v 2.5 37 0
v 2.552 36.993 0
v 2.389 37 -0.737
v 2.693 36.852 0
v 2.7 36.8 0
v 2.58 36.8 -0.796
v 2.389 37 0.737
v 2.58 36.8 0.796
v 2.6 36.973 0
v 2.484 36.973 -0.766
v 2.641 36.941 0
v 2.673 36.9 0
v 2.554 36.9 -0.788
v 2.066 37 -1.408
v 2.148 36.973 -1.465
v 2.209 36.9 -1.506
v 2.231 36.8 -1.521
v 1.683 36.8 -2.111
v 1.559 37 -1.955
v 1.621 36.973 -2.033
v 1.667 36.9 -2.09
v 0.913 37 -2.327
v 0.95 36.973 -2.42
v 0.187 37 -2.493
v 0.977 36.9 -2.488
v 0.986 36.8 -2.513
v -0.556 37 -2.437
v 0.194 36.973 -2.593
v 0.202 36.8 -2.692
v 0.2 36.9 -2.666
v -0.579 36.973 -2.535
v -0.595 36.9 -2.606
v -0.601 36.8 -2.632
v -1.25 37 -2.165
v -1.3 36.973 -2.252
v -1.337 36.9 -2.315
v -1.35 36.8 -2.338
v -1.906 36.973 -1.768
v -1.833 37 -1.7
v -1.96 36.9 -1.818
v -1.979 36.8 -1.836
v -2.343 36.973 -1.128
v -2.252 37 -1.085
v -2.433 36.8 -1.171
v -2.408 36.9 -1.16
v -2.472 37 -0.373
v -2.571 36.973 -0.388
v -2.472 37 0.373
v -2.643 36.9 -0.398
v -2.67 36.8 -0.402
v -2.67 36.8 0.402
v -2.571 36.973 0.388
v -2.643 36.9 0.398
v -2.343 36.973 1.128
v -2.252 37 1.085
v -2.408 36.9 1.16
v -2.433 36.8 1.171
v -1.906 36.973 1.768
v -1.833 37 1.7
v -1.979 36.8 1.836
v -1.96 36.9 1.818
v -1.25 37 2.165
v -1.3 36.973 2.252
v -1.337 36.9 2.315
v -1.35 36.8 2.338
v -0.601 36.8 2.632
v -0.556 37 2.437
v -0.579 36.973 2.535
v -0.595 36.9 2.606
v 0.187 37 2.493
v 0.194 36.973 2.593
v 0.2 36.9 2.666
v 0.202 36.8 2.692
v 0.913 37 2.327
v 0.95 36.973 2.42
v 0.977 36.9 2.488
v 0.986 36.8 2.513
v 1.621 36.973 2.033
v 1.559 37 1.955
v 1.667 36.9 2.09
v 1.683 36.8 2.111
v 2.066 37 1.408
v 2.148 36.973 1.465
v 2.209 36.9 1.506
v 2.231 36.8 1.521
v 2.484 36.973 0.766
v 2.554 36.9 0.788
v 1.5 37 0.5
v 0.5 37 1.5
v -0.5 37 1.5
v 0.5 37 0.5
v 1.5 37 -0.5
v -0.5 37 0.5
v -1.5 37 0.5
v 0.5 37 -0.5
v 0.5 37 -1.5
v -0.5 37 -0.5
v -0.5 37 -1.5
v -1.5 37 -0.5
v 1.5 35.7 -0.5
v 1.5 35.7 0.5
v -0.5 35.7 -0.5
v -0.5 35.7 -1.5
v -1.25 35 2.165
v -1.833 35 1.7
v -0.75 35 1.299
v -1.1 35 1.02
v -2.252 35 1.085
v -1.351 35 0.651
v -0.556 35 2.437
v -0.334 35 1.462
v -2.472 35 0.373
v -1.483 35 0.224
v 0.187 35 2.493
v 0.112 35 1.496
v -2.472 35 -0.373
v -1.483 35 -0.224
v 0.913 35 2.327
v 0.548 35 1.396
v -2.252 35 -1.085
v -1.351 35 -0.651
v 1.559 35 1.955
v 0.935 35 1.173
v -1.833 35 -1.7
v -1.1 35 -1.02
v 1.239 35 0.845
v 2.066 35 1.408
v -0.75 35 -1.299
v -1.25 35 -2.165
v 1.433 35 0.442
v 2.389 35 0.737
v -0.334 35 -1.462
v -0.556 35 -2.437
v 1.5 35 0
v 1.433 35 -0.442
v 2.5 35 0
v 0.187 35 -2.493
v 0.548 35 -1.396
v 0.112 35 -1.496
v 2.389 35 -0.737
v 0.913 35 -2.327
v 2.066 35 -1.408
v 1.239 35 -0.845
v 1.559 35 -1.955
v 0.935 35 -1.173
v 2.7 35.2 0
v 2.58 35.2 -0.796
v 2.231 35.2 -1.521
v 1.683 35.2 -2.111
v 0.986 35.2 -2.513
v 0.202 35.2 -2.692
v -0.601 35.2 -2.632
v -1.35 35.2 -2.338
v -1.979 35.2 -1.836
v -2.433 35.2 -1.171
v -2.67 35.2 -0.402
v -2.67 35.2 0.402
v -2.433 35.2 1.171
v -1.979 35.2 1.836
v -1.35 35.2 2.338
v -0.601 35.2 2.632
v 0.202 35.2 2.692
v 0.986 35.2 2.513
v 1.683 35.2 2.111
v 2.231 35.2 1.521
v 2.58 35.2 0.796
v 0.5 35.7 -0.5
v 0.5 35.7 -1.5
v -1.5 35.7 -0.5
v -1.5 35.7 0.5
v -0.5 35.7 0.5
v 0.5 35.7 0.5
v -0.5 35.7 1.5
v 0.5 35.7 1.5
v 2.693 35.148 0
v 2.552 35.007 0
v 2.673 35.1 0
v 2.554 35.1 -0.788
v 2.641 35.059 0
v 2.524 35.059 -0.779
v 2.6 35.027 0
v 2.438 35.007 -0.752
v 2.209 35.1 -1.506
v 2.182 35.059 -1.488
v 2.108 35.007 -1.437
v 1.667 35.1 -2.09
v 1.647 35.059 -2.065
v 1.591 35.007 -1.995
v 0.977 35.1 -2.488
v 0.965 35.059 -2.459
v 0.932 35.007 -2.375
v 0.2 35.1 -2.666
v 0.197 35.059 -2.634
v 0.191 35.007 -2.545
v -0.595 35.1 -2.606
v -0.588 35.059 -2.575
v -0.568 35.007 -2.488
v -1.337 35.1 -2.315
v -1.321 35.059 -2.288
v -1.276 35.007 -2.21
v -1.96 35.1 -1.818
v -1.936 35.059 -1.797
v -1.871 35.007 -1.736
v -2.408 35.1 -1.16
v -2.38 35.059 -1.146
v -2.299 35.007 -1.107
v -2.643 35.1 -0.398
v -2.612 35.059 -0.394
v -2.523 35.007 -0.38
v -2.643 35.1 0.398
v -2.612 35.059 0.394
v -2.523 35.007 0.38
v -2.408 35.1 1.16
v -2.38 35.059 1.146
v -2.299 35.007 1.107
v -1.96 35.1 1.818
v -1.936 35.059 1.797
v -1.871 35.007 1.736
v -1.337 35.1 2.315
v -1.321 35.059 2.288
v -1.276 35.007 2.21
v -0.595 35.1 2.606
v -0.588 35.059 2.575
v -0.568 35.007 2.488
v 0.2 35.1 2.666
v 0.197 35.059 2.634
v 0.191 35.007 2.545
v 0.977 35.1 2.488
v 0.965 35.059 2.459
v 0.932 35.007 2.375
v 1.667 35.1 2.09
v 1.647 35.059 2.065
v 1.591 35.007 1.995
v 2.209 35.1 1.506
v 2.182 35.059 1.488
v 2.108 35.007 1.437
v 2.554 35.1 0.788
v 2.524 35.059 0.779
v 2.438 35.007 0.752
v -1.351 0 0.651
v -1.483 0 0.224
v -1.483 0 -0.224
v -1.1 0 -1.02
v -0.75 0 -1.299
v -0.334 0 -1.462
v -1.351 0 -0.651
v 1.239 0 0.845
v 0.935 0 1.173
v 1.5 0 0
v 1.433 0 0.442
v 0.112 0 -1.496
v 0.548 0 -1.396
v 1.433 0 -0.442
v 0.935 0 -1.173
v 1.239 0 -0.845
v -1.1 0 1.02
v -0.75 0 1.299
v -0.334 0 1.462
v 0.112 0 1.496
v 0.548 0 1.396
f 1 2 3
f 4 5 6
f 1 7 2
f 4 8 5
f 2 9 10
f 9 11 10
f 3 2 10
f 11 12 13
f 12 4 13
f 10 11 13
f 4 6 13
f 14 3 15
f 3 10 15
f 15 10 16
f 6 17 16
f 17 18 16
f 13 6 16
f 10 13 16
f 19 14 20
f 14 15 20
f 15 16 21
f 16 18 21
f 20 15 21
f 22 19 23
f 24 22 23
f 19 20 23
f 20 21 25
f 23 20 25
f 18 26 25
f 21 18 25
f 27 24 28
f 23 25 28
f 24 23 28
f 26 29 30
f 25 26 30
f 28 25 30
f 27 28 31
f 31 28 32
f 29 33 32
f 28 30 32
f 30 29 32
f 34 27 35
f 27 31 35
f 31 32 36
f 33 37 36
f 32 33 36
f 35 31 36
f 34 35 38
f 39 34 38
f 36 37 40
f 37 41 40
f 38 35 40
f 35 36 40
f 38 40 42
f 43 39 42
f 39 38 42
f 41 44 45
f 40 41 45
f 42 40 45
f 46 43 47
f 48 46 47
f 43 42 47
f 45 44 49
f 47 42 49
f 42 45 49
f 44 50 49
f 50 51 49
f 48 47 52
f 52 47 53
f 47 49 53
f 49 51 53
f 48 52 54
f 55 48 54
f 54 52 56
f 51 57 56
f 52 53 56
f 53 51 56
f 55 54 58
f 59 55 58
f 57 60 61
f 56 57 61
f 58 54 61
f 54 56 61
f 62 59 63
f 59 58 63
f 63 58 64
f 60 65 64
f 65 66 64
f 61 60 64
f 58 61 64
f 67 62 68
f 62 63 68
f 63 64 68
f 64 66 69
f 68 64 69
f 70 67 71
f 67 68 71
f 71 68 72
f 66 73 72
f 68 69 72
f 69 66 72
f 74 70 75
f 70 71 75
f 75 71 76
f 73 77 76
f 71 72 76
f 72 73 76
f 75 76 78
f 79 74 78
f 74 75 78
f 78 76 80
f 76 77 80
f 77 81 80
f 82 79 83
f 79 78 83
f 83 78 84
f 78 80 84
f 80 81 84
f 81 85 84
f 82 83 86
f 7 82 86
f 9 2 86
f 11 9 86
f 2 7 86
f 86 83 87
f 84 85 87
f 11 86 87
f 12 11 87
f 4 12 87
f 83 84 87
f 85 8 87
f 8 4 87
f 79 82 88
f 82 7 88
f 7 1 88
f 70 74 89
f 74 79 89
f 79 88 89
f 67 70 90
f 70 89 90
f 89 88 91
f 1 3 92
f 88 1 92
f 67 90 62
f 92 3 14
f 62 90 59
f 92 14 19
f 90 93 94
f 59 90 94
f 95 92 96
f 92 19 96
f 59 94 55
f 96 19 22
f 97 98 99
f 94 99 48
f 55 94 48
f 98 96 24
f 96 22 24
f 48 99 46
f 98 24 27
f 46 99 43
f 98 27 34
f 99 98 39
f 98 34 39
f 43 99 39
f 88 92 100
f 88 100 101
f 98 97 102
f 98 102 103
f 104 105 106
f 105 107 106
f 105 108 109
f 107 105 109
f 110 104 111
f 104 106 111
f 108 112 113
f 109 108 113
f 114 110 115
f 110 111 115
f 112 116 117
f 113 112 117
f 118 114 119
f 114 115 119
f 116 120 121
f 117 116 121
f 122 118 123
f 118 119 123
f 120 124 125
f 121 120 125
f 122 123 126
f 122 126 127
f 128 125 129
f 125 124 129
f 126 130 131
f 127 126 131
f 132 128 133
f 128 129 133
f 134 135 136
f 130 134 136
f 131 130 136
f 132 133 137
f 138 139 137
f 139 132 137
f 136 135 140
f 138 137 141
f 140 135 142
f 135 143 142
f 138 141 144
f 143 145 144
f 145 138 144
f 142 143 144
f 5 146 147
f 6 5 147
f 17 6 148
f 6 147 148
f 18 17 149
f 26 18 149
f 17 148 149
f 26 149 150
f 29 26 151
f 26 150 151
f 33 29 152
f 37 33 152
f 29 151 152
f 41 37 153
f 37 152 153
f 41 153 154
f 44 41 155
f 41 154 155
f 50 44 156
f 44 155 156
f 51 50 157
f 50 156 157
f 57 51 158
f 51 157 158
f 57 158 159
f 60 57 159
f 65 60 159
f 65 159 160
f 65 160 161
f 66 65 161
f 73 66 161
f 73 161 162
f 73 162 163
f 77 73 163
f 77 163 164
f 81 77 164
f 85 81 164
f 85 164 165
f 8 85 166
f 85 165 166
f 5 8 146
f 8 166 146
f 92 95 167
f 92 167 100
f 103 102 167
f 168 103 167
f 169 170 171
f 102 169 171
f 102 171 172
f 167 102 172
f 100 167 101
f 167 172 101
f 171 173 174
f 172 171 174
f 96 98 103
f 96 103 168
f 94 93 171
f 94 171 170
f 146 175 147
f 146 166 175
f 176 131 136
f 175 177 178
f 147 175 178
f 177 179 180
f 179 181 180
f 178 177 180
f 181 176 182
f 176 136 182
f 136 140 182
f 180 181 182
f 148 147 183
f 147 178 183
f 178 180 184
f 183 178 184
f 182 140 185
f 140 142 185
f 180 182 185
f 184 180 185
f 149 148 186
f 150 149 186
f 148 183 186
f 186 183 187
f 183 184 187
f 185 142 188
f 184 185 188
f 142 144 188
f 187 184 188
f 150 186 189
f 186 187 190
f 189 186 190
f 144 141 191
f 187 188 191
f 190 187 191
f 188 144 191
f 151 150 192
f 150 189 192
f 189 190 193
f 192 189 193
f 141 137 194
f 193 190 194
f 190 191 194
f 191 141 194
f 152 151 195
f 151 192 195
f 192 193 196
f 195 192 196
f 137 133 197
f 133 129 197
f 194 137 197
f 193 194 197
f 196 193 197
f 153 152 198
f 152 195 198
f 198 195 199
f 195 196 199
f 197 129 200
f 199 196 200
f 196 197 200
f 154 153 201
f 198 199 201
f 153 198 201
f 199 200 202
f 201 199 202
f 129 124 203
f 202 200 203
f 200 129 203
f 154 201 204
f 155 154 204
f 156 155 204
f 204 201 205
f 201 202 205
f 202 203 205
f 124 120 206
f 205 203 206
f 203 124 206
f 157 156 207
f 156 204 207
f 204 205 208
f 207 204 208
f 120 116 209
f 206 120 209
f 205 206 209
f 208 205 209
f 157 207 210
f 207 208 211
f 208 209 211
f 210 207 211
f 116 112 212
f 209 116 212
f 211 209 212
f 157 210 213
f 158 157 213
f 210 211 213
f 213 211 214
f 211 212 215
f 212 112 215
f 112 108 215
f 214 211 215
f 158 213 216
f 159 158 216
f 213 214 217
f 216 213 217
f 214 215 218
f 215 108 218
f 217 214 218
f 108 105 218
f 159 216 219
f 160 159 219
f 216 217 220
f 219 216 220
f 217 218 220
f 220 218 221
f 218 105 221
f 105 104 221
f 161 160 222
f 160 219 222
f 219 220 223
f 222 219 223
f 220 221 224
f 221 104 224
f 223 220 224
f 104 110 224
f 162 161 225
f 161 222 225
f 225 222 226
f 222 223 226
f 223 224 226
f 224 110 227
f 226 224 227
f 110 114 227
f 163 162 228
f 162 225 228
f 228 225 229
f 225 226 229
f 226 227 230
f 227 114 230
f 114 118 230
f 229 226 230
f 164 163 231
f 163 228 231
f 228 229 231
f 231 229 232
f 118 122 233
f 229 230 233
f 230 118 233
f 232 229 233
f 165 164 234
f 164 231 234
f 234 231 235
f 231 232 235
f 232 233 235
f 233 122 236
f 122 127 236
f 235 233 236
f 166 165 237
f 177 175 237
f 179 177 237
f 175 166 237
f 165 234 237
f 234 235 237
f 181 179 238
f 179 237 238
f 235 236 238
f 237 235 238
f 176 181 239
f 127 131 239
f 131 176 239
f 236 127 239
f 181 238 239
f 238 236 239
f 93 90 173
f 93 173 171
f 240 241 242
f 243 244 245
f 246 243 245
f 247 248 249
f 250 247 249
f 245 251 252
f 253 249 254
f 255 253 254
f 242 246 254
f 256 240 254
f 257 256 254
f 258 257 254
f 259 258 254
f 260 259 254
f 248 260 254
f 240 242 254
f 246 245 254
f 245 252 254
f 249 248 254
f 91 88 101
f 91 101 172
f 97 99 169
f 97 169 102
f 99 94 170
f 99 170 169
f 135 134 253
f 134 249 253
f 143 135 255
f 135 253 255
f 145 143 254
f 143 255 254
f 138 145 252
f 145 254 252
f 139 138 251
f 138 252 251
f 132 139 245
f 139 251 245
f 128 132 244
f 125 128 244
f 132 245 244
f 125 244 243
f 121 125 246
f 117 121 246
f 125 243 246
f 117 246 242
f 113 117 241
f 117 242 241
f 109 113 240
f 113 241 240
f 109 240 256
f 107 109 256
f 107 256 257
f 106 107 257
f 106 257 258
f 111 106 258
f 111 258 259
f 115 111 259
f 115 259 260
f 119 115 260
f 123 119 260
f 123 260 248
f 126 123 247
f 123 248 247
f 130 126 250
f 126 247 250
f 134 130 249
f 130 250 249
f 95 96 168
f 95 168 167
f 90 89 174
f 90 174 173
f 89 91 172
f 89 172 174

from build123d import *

# Parameters (mm, degrees)
FILLET_R     = 0.2
POCKET_DEPTH = 1.3


with BuildPart() as part:
    # Sketch → Revolution (revolve)
    with BuildSketch(Plane.XY):
        Polygon((0, 0), (0, 37), (2.7, 37), (2.7, 35), (1.5, 35), (1.5, 0), align=None)
    revolve(axis=Axis((0, 0, 0), (0, 1, 0)))

    # Fillet
    fillet_edges = [part.edges().sort_by_distance(p)[0] for p in [
        (-2.7, 35, 0),
        (-2.7, 37, 0),
    ]]
    fillet(fillet_edges, radius=FILLET_R)

    # Sketch001 (on Face1 of Fillet) → Pocket (cut)
    with BuildSketch(Plane(origin=(0, 37, 0), x_dir=(-1, 0, 0), z_dir=(0, 1, 0))):
        Polygon((0.5, 1.5), (0.5, 0.5), (1.5, 0.5), (1.5, -0.5), (0.5, -0.5), (0.5, -1.5), (-0.5, -1.5), (-0.5, -0.5), (-1.5, -0.5), (-1.5, 0.5), (-0.5, 0.5), (-0.5, 1.5), align=None)
    extrude(amount=-POCKET_DEPTH, mode=Mode.SUBTRACT)


solid = part.part
